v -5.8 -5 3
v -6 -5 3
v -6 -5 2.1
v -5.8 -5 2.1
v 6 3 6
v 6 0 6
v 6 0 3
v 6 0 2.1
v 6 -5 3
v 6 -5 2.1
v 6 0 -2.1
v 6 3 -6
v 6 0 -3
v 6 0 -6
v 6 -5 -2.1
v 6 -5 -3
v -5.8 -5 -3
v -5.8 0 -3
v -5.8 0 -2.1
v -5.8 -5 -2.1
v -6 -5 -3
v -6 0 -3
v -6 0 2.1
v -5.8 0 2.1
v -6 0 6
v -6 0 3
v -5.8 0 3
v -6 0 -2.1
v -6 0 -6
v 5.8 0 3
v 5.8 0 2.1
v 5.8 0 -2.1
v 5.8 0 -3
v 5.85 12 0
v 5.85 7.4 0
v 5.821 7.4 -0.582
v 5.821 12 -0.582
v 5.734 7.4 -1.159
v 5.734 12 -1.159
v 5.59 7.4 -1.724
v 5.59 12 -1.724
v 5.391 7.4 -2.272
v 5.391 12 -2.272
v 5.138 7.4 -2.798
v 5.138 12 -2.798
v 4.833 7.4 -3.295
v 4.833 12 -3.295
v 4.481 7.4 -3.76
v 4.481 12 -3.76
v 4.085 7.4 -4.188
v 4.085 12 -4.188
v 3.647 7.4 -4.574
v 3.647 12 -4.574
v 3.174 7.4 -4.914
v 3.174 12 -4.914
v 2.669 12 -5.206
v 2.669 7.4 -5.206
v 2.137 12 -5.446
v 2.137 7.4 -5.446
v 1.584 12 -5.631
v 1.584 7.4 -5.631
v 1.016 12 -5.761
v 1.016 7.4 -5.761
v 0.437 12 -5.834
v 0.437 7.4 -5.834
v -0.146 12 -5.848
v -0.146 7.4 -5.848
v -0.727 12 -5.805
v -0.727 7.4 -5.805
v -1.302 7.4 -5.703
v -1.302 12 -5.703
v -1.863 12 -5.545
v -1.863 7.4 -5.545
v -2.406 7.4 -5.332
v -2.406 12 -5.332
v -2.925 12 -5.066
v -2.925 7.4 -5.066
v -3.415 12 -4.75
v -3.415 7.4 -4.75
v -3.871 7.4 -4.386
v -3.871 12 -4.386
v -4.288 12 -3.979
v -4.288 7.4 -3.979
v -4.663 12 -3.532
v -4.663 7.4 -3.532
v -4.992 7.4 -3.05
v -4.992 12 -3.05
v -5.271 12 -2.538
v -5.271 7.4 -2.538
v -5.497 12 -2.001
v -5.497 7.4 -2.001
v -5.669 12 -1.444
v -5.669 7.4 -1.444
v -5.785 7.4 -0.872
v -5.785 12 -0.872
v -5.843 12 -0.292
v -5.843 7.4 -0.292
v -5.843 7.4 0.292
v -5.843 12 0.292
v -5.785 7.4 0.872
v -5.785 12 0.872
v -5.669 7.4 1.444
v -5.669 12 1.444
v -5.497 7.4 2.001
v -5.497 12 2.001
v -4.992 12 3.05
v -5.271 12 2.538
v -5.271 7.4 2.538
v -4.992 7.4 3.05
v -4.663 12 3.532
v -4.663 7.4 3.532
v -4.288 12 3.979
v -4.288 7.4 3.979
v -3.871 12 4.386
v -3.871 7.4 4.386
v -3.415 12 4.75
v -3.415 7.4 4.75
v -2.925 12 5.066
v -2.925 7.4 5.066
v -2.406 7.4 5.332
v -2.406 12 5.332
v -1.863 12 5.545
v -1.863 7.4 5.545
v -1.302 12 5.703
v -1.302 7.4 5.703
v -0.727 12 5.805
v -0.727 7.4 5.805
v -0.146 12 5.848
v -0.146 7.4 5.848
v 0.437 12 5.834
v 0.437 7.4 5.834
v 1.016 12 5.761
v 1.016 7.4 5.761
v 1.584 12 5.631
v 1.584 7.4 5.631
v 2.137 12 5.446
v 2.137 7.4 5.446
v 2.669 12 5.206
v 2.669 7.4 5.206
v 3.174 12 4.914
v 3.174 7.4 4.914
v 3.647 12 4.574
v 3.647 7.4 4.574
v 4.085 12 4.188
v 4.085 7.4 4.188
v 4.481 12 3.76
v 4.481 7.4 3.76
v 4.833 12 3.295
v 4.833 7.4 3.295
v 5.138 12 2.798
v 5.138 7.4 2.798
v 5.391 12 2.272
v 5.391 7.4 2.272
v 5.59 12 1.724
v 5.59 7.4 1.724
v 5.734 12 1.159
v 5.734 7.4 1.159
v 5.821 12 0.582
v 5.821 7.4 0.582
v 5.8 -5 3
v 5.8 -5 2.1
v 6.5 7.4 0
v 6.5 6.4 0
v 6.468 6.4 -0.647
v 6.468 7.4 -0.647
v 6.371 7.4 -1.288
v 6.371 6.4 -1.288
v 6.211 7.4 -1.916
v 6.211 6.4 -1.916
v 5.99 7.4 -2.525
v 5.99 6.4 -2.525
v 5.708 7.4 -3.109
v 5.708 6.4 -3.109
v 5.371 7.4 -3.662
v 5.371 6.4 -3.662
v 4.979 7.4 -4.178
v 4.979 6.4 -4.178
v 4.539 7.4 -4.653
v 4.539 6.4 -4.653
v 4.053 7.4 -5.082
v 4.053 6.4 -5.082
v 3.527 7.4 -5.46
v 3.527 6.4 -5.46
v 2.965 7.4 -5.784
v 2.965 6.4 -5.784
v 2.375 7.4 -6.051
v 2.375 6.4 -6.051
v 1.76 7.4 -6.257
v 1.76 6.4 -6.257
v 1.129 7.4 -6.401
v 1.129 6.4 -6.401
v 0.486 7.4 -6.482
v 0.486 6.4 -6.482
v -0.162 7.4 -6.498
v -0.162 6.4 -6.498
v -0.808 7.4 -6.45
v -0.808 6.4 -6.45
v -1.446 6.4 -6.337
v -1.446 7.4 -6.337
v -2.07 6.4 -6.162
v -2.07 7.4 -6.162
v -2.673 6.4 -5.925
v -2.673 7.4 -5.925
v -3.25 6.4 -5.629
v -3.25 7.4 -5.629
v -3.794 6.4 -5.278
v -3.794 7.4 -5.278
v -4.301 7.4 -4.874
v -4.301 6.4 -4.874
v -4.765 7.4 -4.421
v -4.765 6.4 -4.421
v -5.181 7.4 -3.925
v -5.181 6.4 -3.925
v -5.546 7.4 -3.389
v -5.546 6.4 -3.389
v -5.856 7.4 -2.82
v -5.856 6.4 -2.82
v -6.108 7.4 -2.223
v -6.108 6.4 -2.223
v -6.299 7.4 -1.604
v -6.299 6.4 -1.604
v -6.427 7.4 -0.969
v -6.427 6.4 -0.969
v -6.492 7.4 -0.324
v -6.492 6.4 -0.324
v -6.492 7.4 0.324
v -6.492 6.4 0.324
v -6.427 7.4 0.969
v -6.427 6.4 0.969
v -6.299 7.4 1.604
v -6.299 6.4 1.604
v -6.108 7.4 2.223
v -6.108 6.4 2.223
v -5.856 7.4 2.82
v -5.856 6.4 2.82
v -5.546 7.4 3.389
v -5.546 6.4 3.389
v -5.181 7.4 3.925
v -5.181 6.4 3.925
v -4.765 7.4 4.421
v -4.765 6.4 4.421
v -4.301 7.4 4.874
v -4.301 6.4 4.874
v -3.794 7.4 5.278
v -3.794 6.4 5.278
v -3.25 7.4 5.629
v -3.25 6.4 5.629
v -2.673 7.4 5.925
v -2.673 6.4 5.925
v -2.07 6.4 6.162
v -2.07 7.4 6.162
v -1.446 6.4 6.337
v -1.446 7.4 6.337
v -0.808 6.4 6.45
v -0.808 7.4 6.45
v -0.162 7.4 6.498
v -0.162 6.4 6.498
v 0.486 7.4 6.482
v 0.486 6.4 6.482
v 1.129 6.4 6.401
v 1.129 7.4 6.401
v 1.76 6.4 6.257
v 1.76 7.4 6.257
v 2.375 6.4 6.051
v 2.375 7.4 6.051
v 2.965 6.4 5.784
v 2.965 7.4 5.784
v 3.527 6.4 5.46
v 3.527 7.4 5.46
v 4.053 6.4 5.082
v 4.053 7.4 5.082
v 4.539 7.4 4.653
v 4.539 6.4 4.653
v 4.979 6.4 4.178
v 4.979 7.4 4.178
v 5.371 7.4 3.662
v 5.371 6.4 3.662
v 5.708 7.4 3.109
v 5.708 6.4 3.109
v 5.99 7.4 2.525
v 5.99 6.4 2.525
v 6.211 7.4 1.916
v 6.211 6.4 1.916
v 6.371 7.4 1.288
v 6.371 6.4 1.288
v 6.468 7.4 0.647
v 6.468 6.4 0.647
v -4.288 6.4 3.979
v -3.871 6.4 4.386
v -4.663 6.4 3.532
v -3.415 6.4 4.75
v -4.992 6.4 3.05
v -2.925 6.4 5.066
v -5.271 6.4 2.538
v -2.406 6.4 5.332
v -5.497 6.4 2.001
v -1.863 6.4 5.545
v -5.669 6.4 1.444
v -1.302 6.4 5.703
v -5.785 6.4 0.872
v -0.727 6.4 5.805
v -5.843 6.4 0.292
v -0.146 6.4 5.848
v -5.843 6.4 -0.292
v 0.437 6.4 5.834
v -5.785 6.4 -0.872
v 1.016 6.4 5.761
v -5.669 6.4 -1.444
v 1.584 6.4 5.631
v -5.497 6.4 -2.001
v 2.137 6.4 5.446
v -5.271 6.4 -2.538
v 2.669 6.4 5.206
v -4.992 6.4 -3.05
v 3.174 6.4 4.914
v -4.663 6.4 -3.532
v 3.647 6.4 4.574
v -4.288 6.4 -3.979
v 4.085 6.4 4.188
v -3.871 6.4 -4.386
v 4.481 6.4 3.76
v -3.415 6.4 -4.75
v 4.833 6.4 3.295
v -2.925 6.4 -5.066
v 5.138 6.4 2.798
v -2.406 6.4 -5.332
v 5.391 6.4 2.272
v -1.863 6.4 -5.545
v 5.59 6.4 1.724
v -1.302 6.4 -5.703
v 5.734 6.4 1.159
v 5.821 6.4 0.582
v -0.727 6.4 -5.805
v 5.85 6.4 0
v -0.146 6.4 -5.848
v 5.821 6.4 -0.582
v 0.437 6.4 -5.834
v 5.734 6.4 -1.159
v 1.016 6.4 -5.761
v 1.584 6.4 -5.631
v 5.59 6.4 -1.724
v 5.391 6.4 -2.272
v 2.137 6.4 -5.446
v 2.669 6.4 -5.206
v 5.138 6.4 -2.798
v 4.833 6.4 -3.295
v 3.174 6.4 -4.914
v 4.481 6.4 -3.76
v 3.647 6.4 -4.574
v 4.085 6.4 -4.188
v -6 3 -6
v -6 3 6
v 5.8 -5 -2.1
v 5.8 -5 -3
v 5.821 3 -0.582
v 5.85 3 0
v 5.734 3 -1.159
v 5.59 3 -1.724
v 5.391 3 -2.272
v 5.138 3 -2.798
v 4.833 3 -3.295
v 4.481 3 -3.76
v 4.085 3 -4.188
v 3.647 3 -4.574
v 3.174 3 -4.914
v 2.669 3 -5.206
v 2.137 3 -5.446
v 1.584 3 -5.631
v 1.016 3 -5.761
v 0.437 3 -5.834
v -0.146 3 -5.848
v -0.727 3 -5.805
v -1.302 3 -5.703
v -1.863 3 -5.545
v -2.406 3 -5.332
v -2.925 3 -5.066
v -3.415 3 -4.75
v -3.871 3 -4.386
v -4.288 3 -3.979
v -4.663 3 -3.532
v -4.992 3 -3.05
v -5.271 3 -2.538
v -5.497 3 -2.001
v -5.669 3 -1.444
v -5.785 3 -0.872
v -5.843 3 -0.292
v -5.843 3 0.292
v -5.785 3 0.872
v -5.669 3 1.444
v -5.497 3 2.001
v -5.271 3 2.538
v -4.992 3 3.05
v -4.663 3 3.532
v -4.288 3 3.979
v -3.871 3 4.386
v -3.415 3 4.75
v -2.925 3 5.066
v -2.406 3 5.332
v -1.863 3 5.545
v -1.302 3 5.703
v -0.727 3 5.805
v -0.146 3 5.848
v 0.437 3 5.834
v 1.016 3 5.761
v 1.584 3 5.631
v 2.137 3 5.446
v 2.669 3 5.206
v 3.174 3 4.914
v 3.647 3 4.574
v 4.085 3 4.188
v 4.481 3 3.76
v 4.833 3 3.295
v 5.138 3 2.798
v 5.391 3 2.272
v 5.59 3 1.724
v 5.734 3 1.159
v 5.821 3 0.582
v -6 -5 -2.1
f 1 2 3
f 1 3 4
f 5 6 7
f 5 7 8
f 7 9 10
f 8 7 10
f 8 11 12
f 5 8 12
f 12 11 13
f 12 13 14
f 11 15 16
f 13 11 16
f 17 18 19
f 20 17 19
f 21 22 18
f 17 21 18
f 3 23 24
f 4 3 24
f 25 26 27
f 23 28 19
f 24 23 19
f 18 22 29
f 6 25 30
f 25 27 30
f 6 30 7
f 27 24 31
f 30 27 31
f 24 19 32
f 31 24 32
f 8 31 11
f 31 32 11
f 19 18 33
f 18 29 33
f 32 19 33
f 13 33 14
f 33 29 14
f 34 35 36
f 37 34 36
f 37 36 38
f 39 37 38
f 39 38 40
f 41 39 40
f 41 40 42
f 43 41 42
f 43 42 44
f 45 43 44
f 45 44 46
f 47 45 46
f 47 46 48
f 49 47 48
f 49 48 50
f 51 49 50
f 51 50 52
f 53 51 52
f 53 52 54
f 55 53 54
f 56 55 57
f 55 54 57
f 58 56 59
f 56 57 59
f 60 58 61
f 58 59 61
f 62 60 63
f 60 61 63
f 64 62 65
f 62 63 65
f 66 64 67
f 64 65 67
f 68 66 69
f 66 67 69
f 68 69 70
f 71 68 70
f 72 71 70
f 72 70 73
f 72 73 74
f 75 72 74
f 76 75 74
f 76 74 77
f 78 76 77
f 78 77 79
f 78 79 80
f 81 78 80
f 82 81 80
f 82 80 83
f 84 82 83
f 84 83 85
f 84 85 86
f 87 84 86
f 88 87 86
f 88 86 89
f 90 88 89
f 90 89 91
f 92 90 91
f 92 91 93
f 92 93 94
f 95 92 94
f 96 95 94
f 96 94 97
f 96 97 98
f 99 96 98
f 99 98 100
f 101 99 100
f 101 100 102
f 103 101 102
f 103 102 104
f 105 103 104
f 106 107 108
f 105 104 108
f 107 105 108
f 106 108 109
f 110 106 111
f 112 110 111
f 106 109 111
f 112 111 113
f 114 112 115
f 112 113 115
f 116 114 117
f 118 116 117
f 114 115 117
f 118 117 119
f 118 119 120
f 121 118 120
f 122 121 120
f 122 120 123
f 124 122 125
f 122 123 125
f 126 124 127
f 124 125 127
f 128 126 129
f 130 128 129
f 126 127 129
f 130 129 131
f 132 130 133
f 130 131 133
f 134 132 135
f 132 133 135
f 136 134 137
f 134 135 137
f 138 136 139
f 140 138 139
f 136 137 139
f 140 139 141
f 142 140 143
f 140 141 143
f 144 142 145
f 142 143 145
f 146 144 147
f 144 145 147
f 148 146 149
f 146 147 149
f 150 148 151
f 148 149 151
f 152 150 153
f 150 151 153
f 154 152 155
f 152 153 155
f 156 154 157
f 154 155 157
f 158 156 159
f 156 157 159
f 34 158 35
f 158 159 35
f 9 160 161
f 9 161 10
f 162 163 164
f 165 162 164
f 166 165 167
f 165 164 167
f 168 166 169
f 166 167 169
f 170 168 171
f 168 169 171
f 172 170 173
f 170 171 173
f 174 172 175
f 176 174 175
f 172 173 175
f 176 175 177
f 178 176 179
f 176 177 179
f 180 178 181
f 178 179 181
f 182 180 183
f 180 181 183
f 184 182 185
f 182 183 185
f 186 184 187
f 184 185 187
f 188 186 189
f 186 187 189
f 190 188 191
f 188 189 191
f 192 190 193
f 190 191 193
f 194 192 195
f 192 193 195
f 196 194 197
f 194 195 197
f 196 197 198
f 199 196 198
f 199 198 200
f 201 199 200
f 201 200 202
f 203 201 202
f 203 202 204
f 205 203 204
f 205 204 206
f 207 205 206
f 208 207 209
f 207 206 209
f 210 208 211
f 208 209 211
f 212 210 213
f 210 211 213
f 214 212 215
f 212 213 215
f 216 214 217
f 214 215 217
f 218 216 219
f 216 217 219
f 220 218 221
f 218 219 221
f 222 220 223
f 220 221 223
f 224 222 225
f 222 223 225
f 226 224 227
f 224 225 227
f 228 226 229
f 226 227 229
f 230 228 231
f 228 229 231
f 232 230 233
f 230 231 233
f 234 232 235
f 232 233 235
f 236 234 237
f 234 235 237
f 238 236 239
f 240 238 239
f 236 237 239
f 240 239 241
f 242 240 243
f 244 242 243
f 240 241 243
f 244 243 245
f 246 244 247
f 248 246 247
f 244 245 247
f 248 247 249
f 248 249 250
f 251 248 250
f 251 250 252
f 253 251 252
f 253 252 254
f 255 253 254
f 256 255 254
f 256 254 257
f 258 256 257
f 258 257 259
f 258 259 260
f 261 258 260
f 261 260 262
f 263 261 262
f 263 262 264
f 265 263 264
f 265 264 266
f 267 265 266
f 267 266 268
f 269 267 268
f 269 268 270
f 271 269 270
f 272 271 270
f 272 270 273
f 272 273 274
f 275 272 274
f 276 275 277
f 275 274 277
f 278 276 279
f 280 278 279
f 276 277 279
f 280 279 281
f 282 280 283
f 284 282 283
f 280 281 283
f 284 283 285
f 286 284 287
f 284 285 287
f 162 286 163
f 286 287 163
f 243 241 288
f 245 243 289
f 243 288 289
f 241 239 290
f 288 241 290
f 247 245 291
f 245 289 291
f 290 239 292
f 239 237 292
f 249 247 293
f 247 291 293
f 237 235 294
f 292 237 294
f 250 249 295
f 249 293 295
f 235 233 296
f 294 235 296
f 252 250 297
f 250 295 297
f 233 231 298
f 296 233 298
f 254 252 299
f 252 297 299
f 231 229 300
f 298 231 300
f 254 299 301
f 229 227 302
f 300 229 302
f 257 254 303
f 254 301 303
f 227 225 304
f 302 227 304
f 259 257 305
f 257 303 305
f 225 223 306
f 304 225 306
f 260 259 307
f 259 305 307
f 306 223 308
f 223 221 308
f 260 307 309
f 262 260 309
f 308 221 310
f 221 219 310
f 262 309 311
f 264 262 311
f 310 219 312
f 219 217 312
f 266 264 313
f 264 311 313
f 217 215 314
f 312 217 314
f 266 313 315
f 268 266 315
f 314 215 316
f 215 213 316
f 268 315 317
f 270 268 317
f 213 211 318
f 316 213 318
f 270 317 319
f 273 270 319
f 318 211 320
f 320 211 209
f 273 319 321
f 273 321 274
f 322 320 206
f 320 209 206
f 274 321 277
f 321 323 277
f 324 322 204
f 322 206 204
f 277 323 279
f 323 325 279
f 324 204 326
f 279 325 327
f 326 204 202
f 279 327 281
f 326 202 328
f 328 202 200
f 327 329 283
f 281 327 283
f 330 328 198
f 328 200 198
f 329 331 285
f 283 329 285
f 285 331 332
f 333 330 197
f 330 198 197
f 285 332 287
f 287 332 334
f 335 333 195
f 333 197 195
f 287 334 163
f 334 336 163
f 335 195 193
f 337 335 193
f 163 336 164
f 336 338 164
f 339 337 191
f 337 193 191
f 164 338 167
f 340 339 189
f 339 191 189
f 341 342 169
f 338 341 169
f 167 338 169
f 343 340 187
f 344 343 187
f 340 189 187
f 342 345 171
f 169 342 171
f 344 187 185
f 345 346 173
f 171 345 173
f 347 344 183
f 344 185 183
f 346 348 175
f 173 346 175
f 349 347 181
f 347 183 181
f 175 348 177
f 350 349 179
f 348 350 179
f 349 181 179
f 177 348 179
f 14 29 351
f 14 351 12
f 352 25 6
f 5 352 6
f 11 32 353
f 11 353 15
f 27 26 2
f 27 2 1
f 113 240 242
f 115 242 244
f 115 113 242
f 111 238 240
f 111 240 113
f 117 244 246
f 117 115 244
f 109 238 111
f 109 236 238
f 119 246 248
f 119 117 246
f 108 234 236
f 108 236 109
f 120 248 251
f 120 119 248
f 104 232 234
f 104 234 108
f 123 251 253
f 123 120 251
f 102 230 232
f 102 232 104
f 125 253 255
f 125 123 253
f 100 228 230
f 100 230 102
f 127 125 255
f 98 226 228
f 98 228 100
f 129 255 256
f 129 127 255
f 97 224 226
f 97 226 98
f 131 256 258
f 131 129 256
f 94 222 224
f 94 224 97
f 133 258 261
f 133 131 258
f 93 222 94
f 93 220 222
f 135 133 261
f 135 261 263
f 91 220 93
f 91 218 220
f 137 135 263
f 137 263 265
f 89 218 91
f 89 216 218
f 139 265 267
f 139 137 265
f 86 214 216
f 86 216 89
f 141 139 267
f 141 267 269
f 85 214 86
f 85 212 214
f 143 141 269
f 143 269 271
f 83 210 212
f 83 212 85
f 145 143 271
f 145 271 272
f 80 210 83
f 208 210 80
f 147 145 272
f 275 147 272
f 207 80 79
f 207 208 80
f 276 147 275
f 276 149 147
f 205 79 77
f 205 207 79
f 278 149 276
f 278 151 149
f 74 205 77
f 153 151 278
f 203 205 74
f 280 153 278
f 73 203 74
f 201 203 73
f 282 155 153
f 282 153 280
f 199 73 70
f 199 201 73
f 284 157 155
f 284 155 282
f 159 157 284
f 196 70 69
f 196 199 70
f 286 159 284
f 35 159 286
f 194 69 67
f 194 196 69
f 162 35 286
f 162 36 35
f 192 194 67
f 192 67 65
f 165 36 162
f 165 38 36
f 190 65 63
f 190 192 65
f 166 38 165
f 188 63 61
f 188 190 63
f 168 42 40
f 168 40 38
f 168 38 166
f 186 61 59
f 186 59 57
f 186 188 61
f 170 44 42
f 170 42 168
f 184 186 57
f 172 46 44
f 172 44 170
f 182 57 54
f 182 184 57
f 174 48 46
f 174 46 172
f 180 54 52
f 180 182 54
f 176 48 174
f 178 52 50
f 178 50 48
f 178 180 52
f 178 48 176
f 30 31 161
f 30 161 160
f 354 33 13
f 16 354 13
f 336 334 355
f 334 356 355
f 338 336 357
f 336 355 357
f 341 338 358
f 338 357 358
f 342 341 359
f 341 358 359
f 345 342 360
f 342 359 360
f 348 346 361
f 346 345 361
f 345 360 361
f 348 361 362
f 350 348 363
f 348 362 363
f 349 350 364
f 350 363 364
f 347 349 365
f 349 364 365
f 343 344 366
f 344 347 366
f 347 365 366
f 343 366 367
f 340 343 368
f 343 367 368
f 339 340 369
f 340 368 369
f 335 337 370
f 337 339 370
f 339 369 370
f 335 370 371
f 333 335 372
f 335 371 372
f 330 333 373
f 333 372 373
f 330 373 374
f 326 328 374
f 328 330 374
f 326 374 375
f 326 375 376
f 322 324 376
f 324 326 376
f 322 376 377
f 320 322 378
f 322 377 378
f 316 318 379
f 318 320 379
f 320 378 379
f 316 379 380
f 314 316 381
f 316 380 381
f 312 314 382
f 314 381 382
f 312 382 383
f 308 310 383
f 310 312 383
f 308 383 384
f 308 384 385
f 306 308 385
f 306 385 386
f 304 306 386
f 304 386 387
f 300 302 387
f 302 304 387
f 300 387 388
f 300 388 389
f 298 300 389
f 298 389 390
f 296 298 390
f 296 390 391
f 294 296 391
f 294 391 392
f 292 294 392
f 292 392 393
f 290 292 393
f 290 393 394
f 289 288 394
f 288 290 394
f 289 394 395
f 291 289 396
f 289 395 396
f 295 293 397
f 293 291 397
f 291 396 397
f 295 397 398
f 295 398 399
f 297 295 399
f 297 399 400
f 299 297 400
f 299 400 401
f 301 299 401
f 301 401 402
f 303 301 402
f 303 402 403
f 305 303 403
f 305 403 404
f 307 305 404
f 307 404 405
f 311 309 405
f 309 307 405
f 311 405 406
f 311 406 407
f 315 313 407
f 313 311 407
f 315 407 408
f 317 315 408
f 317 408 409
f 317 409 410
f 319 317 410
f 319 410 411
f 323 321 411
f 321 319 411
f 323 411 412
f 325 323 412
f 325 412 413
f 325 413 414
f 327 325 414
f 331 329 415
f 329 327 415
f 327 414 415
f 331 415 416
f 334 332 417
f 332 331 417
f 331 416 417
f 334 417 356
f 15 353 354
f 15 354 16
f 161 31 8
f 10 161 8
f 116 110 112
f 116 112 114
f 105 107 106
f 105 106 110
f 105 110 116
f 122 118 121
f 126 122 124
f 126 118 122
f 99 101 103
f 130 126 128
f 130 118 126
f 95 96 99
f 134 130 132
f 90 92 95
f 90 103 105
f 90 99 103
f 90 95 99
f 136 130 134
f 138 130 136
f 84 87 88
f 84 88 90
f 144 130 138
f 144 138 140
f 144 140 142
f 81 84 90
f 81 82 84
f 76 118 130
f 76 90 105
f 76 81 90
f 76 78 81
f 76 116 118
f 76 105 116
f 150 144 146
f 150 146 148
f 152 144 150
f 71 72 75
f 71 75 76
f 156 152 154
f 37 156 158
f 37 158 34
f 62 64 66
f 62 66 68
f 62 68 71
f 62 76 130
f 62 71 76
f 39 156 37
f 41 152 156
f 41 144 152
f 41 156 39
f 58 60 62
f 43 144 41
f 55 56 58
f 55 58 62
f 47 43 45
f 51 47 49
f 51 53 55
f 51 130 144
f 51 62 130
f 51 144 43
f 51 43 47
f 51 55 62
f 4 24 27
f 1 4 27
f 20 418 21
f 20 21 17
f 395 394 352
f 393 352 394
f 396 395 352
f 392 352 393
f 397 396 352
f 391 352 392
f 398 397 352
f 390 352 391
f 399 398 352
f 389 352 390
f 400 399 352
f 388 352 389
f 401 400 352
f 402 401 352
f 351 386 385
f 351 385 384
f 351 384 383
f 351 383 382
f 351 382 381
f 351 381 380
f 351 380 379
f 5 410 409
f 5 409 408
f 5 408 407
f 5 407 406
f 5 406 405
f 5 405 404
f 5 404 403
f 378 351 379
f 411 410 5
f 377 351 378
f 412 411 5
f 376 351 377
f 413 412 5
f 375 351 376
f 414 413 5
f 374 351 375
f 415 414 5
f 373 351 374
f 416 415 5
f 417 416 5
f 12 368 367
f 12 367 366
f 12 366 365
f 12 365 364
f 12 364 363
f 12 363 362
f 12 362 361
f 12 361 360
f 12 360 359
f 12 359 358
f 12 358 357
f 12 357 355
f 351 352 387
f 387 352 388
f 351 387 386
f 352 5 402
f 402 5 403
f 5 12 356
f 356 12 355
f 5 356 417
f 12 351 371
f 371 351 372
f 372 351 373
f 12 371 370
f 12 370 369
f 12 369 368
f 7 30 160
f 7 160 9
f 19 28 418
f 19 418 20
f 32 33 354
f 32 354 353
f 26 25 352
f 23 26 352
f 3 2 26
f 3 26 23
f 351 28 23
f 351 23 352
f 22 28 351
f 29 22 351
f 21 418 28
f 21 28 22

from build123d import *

# Parameters (mm, degrees)
SKETCH_1_W      = 12
SKETCH_1_H      = 12
EXTRUDE_1_DEPTH = 3
SKETCH_2_W      = 5
SKETCH_2_H      = 5
EXTRUDE_2_DEPTH = 3.4
SKETCH_3_R      = 6.5
EXTRUDE_3_DEPTH = 1
EXTRUDE_START   = -7.4
SKETCH_4_R      = 5.85
EXTRUDE_4_DEPTH = 12
SKETCH_5_W      = 0.2
SKETCH_5_H      = 0.9
EXTRUDE_5_DEPTH = 5


with BuildPart() as part:
    # 草图1 → 凸台-拉伸1 (new body)
    with BuildSketch(Plane(origin=(0, 0, 0), x_dir=(1, 0, 0), z_dir=(0, 1, 0))):
        Rectangle(SKETCH_1_W, SKETCH_1_H)
    extrude(amount=EXTRUDE_1_DEPTH)

    # 草图2 → 凸台-拉伸2 (add)
    with BuildSketch(Plane(origin=(0, 3, 0), x_dir=(1, 0, 0), z_dir=(0, 1, 0))):
        Rectangle(SKETCH_2_W, SKETCH_2_H)
    extrude(amount=EXTRUDE_2_DEPTH)

    # 草图3 → 凸台-拉伸3 (add)
    with BuildSketch(Plane(origin=(0, 6.4, 0), x_dir=(1, 0, 0), z_dir=(0, 1, 0))):
        Circle(SKETCH_3_R)
    extrude(amount=EXTRUDE_3_DEPTH)

    # 草图4 → 凸台-拉伸4 (add)
    with BuildSketch(Plane(origin=(0, 7.4, 0), x_dir=(1, 0, 0), z_dir=(0, 1, 0)).offset(EXTRUDE_START)):
        Circle(SKETCH_4_R)
    extrude(amount=EXTRUDE_4_DEPTH)

    # 草图5 → 凸台-拉伸5 (add)
    with BuildSketch(Plane.XZ):
        with Locations((5.9, 2.55)):
            Rectangle(SKETCH_5_W, SKETCH_5_H)
        with Locations((5.9, -2.55)):
            Rectangle(SKETCH_5_W, SKETCH_5_H)
        with Locations((-5.9, -2.55)):
            Rectangle(SKETCH_5_W, SKETCH_5_H)
        with Locations((-5.9, 2.55)):
            Rectangle(SKETCH_5_W, SKETCH_5_H)
    extrude(amount=EXTRUDE_5_DEPTH)


solid = part.part
